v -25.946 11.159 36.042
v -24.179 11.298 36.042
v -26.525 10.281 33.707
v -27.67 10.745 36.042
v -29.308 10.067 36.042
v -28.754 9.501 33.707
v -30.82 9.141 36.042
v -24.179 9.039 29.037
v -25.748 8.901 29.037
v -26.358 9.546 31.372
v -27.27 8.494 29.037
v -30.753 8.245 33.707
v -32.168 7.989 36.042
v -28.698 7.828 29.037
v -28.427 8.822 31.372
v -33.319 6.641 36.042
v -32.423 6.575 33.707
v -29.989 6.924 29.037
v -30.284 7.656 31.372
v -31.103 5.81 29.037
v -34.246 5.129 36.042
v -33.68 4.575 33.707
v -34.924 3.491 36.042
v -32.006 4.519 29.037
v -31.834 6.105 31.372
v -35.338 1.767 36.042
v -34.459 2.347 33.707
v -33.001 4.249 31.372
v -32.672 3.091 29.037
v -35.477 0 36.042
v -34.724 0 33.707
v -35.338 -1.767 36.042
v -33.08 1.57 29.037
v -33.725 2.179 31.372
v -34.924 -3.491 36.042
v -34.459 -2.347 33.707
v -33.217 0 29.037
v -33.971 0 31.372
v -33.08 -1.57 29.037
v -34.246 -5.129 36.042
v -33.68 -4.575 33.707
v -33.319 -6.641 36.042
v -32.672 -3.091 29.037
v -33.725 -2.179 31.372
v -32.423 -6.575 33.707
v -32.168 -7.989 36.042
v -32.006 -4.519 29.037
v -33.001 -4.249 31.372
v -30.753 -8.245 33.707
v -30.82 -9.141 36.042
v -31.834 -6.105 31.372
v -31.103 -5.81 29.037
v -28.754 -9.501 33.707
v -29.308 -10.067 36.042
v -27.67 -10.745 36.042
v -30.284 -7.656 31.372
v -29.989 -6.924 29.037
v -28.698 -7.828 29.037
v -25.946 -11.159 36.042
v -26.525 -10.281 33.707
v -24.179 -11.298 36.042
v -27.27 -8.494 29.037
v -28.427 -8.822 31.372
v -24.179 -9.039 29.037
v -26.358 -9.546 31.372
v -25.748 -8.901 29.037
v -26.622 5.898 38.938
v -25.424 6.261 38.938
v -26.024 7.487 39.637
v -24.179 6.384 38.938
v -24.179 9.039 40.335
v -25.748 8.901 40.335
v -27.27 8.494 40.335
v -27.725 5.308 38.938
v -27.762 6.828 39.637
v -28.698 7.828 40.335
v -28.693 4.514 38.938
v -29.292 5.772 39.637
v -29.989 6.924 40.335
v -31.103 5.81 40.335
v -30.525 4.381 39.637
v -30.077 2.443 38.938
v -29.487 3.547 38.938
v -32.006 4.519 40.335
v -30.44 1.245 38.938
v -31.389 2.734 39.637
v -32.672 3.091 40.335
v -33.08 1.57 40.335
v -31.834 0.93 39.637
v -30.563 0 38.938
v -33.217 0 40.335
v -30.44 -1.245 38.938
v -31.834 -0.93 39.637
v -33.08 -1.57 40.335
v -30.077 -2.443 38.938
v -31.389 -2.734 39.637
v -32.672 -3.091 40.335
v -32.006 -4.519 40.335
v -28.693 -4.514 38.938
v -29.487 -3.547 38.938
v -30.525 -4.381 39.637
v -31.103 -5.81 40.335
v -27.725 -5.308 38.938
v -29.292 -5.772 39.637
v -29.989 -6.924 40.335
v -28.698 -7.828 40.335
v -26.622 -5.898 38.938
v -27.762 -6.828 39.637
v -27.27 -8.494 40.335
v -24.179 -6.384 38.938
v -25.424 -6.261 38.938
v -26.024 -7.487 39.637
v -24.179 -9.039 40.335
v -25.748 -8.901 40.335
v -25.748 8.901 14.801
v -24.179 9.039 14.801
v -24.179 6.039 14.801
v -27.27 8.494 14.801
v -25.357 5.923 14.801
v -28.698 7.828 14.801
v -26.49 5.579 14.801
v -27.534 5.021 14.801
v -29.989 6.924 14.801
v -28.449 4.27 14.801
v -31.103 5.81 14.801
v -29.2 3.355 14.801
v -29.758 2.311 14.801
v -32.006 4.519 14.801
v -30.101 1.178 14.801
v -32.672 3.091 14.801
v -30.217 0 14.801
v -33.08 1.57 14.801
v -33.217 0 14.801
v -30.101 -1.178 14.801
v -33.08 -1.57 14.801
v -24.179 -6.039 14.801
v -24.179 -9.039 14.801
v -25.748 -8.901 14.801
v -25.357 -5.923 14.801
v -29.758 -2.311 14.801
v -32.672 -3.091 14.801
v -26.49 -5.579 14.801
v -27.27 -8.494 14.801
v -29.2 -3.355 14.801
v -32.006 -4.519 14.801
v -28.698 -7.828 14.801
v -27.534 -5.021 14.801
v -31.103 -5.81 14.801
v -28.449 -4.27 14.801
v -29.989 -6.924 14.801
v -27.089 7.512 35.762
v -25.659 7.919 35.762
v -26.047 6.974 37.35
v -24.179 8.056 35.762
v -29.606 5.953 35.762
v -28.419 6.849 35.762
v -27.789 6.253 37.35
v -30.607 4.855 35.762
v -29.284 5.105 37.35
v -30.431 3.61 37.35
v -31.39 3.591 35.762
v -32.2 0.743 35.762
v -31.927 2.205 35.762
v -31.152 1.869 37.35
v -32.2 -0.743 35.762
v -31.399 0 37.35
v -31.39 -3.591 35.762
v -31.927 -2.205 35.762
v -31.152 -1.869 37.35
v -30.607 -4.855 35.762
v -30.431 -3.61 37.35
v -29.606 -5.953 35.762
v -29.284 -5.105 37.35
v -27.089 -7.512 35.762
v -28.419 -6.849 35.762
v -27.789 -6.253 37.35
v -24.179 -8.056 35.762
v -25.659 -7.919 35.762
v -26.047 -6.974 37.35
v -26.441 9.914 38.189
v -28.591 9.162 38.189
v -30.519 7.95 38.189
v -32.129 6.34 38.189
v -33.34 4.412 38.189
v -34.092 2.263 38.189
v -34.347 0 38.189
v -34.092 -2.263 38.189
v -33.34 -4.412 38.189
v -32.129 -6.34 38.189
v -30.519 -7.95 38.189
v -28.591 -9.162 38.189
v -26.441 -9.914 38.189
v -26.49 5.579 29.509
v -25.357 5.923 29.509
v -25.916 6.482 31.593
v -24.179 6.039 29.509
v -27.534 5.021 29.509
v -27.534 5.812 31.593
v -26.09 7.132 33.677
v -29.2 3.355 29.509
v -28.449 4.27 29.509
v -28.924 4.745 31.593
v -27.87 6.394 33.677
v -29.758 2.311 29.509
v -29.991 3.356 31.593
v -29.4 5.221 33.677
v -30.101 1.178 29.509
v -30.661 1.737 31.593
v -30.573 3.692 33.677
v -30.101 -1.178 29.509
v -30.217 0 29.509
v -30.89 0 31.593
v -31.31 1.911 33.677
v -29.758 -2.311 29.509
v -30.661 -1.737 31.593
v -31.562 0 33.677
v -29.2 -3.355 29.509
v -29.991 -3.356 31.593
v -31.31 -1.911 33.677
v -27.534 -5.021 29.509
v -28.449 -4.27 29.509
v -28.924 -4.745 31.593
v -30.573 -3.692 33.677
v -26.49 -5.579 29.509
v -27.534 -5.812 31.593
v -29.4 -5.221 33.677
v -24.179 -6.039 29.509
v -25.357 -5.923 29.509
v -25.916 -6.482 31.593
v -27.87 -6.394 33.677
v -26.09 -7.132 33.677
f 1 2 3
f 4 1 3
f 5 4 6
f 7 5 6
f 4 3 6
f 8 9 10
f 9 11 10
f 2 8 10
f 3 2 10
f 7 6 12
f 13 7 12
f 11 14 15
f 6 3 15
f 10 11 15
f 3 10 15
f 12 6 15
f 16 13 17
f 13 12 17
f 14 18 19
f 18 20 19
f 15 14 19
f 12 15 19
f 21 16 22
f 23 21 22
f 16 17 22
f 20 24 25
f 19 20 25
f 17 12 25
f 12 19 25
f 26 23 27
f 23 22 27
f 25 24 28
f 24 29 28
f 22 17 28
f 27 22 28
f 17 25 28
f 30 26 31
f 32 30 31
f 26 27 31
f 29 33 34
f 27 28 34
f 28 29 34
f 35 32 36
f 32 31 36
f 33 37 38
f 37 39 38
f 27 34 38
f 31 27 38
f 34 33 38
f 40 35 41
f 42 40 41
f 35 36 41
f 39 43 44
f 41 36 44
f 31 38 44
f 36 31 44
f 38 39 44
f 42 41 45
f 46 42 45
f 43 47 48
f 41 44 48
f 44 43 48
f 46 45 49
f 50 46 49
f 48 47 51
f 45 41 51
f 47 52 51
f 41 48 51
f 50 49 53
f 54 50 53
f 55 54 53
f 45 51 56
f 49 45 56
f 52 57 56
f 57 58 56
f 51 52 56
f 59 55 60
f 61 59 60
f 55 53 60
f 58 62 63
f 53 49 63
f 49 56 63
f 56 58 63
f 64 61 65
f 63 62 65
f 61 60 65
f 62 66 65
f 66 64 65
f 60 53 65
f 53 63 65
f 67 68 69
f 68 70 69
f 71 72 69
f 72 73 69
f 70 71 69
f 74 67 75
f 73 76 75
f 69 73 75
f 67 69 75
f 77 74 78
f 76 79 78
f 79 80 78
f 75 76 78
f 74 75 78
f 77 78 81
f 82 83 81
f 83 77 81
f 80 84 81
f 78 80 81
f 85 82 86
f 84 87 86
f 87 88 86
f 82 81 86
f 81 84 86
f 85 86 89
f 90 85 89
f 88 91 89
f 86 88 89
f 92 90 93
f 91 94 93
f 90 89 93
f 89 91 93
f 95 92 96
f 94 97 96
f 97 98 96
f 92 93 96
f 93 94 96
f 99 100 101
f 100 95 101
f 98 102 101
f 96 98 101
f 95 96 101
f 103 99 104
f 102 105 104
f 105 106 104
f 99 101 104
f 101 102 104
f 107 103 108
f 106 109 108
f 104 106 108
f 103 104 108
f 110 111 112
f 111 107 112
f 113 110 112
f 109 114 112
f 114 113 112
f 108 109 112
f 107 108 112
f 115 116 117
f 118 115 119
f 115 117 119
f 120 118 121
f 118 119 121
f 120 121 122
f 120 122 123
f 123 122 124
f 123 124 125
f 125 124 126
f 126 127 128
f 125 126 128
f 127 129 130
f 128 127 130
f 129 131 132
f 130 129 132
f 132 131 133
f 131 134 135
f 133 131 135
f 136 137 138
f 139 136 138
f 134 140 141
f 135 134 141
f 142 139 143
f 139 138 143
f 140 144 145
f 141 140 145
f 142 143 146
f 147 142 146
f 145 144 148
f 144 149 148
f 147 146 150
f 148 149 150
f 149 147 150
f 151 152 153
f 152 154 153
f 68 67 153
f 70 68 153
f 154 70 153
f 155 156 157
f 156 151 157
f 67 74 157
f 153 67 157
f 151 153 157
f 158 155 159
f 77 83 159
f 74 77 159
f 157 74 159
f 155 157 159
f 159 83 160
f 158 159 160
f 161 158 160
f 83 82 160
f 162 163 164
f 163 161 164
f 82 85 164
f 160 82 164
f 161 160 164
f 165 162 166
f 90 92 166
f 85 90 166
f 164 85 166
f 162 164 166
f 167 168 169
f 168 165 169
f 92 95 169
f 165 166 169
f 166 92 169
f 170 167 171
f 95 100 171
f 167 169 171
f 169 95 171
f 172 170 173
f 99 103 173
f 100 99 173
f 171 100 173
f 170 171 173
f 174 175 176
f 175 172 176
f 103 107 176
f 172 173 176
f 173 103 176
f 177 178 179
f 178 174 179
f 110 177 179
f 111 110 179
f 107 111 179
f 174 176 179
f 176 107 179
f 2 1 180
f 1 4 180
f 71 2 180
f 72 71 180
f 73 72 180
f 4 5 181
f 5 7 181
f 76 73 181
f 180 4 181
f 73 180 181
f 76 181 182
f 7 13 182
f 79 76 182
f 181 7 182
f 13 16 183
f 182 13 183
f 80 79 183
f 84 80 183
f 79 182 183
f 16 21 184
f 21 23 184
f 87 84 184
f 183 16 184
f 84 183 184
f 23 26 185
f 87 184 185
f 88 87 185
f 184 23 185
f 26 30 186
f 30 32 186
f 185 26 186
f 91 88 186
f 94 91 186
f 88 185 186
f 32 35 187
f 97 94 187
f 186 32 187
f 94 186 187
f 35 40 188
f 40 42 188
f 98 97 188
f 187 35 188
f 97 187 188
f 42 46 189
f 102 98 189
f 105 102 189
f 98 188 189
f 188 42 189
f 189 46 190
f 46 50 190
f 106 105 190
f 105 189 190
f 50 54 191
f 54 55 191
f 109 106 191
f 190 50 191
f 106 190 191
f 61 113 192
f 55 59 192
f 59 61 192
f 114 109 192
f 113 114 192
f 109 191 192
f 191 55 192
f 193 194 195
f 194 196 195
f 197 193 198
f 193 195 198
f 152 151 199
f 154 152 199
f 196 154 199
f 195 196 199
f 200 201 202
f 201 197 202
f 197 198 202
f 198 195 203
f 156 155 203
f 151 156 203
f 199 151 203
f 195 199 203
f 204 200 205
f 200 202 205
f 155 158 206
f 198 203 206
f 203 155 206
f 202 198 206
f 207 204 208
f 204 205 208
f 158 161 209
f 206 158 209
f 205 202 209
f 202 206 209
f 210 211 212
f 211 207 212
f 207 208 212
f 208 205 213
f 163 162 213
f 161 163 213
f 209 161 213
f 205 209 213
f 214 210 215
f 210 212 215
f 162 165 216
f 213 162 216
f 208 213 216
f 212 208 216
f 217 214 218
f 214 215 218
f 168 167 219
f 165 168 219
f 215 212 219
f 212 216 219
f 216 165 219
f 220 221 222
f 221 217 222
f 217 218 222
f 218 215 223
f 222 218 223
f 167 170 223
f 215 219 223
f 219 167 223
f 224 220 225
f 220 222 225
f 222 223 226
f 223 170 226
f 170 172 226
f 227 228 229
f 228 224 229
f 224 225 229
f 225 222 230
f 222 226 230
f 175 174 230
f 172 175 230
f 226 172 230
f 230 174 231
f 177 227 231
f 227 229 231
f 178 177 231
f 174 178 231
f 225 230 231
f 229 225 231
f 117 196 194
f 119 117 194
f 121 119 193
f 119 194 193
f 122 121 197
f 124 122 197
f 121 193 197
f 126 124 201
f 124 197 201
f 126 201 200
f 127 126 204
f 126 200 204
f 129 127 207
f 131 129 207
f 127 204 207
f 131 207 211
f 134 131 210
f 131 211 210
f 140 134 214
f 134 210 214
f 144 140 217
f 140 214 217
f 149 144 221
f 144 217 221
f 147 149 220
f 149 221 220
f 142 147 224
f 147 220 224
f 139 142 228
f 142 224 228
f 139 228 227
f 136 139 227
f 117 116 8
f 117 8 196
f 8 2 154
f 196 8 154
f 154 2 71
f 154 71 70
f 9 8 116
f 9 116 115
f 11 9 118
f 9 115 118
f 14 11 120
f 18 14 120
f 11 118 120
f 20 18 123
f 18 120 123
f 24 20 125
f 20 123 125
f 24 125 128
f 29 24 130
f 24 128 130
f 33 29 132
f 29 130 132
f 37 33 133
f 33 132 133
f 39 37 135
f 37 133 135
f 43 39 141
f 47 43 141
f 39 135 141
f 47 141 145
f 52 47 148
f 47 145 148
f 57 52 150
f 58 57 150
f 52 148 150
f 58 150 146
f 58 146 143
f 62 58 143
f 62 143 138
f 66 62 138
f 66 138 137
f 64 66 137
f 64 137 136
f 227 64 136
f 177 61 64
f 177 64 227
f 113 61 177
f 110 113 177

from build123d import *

# Parameters (mm, degrees)
F1_ANGLE = 180


with BuildPart() as f1:
    # F0 (on Front) → F1 (revolve, symmetric)
    with BuildSketch(Plane.XZ) as f1_sk:
        Polygon((-30.562608, 38.93813), (-33.217363, 40.335368), (-35.477046, 36.041968), (-33.217363, 29.036945), (-33.217363, 14.800933), (-30.217363, 14.800933), (-30.217363, 29.508843), (-32.234412, 35.7617), align=None)
    revolve(axis=Axis((-24.178624, 0, 27.116214), (0, 0, -1)), revolution_arc=F1_ANGLE / 2)
    revolve(f1_sk.sketch, axis=Axis((-24.178624, 0, 27.116214), (0, 0, 1)), revolution_arc=F1_ANGLE / 2)


solid = f1.part
